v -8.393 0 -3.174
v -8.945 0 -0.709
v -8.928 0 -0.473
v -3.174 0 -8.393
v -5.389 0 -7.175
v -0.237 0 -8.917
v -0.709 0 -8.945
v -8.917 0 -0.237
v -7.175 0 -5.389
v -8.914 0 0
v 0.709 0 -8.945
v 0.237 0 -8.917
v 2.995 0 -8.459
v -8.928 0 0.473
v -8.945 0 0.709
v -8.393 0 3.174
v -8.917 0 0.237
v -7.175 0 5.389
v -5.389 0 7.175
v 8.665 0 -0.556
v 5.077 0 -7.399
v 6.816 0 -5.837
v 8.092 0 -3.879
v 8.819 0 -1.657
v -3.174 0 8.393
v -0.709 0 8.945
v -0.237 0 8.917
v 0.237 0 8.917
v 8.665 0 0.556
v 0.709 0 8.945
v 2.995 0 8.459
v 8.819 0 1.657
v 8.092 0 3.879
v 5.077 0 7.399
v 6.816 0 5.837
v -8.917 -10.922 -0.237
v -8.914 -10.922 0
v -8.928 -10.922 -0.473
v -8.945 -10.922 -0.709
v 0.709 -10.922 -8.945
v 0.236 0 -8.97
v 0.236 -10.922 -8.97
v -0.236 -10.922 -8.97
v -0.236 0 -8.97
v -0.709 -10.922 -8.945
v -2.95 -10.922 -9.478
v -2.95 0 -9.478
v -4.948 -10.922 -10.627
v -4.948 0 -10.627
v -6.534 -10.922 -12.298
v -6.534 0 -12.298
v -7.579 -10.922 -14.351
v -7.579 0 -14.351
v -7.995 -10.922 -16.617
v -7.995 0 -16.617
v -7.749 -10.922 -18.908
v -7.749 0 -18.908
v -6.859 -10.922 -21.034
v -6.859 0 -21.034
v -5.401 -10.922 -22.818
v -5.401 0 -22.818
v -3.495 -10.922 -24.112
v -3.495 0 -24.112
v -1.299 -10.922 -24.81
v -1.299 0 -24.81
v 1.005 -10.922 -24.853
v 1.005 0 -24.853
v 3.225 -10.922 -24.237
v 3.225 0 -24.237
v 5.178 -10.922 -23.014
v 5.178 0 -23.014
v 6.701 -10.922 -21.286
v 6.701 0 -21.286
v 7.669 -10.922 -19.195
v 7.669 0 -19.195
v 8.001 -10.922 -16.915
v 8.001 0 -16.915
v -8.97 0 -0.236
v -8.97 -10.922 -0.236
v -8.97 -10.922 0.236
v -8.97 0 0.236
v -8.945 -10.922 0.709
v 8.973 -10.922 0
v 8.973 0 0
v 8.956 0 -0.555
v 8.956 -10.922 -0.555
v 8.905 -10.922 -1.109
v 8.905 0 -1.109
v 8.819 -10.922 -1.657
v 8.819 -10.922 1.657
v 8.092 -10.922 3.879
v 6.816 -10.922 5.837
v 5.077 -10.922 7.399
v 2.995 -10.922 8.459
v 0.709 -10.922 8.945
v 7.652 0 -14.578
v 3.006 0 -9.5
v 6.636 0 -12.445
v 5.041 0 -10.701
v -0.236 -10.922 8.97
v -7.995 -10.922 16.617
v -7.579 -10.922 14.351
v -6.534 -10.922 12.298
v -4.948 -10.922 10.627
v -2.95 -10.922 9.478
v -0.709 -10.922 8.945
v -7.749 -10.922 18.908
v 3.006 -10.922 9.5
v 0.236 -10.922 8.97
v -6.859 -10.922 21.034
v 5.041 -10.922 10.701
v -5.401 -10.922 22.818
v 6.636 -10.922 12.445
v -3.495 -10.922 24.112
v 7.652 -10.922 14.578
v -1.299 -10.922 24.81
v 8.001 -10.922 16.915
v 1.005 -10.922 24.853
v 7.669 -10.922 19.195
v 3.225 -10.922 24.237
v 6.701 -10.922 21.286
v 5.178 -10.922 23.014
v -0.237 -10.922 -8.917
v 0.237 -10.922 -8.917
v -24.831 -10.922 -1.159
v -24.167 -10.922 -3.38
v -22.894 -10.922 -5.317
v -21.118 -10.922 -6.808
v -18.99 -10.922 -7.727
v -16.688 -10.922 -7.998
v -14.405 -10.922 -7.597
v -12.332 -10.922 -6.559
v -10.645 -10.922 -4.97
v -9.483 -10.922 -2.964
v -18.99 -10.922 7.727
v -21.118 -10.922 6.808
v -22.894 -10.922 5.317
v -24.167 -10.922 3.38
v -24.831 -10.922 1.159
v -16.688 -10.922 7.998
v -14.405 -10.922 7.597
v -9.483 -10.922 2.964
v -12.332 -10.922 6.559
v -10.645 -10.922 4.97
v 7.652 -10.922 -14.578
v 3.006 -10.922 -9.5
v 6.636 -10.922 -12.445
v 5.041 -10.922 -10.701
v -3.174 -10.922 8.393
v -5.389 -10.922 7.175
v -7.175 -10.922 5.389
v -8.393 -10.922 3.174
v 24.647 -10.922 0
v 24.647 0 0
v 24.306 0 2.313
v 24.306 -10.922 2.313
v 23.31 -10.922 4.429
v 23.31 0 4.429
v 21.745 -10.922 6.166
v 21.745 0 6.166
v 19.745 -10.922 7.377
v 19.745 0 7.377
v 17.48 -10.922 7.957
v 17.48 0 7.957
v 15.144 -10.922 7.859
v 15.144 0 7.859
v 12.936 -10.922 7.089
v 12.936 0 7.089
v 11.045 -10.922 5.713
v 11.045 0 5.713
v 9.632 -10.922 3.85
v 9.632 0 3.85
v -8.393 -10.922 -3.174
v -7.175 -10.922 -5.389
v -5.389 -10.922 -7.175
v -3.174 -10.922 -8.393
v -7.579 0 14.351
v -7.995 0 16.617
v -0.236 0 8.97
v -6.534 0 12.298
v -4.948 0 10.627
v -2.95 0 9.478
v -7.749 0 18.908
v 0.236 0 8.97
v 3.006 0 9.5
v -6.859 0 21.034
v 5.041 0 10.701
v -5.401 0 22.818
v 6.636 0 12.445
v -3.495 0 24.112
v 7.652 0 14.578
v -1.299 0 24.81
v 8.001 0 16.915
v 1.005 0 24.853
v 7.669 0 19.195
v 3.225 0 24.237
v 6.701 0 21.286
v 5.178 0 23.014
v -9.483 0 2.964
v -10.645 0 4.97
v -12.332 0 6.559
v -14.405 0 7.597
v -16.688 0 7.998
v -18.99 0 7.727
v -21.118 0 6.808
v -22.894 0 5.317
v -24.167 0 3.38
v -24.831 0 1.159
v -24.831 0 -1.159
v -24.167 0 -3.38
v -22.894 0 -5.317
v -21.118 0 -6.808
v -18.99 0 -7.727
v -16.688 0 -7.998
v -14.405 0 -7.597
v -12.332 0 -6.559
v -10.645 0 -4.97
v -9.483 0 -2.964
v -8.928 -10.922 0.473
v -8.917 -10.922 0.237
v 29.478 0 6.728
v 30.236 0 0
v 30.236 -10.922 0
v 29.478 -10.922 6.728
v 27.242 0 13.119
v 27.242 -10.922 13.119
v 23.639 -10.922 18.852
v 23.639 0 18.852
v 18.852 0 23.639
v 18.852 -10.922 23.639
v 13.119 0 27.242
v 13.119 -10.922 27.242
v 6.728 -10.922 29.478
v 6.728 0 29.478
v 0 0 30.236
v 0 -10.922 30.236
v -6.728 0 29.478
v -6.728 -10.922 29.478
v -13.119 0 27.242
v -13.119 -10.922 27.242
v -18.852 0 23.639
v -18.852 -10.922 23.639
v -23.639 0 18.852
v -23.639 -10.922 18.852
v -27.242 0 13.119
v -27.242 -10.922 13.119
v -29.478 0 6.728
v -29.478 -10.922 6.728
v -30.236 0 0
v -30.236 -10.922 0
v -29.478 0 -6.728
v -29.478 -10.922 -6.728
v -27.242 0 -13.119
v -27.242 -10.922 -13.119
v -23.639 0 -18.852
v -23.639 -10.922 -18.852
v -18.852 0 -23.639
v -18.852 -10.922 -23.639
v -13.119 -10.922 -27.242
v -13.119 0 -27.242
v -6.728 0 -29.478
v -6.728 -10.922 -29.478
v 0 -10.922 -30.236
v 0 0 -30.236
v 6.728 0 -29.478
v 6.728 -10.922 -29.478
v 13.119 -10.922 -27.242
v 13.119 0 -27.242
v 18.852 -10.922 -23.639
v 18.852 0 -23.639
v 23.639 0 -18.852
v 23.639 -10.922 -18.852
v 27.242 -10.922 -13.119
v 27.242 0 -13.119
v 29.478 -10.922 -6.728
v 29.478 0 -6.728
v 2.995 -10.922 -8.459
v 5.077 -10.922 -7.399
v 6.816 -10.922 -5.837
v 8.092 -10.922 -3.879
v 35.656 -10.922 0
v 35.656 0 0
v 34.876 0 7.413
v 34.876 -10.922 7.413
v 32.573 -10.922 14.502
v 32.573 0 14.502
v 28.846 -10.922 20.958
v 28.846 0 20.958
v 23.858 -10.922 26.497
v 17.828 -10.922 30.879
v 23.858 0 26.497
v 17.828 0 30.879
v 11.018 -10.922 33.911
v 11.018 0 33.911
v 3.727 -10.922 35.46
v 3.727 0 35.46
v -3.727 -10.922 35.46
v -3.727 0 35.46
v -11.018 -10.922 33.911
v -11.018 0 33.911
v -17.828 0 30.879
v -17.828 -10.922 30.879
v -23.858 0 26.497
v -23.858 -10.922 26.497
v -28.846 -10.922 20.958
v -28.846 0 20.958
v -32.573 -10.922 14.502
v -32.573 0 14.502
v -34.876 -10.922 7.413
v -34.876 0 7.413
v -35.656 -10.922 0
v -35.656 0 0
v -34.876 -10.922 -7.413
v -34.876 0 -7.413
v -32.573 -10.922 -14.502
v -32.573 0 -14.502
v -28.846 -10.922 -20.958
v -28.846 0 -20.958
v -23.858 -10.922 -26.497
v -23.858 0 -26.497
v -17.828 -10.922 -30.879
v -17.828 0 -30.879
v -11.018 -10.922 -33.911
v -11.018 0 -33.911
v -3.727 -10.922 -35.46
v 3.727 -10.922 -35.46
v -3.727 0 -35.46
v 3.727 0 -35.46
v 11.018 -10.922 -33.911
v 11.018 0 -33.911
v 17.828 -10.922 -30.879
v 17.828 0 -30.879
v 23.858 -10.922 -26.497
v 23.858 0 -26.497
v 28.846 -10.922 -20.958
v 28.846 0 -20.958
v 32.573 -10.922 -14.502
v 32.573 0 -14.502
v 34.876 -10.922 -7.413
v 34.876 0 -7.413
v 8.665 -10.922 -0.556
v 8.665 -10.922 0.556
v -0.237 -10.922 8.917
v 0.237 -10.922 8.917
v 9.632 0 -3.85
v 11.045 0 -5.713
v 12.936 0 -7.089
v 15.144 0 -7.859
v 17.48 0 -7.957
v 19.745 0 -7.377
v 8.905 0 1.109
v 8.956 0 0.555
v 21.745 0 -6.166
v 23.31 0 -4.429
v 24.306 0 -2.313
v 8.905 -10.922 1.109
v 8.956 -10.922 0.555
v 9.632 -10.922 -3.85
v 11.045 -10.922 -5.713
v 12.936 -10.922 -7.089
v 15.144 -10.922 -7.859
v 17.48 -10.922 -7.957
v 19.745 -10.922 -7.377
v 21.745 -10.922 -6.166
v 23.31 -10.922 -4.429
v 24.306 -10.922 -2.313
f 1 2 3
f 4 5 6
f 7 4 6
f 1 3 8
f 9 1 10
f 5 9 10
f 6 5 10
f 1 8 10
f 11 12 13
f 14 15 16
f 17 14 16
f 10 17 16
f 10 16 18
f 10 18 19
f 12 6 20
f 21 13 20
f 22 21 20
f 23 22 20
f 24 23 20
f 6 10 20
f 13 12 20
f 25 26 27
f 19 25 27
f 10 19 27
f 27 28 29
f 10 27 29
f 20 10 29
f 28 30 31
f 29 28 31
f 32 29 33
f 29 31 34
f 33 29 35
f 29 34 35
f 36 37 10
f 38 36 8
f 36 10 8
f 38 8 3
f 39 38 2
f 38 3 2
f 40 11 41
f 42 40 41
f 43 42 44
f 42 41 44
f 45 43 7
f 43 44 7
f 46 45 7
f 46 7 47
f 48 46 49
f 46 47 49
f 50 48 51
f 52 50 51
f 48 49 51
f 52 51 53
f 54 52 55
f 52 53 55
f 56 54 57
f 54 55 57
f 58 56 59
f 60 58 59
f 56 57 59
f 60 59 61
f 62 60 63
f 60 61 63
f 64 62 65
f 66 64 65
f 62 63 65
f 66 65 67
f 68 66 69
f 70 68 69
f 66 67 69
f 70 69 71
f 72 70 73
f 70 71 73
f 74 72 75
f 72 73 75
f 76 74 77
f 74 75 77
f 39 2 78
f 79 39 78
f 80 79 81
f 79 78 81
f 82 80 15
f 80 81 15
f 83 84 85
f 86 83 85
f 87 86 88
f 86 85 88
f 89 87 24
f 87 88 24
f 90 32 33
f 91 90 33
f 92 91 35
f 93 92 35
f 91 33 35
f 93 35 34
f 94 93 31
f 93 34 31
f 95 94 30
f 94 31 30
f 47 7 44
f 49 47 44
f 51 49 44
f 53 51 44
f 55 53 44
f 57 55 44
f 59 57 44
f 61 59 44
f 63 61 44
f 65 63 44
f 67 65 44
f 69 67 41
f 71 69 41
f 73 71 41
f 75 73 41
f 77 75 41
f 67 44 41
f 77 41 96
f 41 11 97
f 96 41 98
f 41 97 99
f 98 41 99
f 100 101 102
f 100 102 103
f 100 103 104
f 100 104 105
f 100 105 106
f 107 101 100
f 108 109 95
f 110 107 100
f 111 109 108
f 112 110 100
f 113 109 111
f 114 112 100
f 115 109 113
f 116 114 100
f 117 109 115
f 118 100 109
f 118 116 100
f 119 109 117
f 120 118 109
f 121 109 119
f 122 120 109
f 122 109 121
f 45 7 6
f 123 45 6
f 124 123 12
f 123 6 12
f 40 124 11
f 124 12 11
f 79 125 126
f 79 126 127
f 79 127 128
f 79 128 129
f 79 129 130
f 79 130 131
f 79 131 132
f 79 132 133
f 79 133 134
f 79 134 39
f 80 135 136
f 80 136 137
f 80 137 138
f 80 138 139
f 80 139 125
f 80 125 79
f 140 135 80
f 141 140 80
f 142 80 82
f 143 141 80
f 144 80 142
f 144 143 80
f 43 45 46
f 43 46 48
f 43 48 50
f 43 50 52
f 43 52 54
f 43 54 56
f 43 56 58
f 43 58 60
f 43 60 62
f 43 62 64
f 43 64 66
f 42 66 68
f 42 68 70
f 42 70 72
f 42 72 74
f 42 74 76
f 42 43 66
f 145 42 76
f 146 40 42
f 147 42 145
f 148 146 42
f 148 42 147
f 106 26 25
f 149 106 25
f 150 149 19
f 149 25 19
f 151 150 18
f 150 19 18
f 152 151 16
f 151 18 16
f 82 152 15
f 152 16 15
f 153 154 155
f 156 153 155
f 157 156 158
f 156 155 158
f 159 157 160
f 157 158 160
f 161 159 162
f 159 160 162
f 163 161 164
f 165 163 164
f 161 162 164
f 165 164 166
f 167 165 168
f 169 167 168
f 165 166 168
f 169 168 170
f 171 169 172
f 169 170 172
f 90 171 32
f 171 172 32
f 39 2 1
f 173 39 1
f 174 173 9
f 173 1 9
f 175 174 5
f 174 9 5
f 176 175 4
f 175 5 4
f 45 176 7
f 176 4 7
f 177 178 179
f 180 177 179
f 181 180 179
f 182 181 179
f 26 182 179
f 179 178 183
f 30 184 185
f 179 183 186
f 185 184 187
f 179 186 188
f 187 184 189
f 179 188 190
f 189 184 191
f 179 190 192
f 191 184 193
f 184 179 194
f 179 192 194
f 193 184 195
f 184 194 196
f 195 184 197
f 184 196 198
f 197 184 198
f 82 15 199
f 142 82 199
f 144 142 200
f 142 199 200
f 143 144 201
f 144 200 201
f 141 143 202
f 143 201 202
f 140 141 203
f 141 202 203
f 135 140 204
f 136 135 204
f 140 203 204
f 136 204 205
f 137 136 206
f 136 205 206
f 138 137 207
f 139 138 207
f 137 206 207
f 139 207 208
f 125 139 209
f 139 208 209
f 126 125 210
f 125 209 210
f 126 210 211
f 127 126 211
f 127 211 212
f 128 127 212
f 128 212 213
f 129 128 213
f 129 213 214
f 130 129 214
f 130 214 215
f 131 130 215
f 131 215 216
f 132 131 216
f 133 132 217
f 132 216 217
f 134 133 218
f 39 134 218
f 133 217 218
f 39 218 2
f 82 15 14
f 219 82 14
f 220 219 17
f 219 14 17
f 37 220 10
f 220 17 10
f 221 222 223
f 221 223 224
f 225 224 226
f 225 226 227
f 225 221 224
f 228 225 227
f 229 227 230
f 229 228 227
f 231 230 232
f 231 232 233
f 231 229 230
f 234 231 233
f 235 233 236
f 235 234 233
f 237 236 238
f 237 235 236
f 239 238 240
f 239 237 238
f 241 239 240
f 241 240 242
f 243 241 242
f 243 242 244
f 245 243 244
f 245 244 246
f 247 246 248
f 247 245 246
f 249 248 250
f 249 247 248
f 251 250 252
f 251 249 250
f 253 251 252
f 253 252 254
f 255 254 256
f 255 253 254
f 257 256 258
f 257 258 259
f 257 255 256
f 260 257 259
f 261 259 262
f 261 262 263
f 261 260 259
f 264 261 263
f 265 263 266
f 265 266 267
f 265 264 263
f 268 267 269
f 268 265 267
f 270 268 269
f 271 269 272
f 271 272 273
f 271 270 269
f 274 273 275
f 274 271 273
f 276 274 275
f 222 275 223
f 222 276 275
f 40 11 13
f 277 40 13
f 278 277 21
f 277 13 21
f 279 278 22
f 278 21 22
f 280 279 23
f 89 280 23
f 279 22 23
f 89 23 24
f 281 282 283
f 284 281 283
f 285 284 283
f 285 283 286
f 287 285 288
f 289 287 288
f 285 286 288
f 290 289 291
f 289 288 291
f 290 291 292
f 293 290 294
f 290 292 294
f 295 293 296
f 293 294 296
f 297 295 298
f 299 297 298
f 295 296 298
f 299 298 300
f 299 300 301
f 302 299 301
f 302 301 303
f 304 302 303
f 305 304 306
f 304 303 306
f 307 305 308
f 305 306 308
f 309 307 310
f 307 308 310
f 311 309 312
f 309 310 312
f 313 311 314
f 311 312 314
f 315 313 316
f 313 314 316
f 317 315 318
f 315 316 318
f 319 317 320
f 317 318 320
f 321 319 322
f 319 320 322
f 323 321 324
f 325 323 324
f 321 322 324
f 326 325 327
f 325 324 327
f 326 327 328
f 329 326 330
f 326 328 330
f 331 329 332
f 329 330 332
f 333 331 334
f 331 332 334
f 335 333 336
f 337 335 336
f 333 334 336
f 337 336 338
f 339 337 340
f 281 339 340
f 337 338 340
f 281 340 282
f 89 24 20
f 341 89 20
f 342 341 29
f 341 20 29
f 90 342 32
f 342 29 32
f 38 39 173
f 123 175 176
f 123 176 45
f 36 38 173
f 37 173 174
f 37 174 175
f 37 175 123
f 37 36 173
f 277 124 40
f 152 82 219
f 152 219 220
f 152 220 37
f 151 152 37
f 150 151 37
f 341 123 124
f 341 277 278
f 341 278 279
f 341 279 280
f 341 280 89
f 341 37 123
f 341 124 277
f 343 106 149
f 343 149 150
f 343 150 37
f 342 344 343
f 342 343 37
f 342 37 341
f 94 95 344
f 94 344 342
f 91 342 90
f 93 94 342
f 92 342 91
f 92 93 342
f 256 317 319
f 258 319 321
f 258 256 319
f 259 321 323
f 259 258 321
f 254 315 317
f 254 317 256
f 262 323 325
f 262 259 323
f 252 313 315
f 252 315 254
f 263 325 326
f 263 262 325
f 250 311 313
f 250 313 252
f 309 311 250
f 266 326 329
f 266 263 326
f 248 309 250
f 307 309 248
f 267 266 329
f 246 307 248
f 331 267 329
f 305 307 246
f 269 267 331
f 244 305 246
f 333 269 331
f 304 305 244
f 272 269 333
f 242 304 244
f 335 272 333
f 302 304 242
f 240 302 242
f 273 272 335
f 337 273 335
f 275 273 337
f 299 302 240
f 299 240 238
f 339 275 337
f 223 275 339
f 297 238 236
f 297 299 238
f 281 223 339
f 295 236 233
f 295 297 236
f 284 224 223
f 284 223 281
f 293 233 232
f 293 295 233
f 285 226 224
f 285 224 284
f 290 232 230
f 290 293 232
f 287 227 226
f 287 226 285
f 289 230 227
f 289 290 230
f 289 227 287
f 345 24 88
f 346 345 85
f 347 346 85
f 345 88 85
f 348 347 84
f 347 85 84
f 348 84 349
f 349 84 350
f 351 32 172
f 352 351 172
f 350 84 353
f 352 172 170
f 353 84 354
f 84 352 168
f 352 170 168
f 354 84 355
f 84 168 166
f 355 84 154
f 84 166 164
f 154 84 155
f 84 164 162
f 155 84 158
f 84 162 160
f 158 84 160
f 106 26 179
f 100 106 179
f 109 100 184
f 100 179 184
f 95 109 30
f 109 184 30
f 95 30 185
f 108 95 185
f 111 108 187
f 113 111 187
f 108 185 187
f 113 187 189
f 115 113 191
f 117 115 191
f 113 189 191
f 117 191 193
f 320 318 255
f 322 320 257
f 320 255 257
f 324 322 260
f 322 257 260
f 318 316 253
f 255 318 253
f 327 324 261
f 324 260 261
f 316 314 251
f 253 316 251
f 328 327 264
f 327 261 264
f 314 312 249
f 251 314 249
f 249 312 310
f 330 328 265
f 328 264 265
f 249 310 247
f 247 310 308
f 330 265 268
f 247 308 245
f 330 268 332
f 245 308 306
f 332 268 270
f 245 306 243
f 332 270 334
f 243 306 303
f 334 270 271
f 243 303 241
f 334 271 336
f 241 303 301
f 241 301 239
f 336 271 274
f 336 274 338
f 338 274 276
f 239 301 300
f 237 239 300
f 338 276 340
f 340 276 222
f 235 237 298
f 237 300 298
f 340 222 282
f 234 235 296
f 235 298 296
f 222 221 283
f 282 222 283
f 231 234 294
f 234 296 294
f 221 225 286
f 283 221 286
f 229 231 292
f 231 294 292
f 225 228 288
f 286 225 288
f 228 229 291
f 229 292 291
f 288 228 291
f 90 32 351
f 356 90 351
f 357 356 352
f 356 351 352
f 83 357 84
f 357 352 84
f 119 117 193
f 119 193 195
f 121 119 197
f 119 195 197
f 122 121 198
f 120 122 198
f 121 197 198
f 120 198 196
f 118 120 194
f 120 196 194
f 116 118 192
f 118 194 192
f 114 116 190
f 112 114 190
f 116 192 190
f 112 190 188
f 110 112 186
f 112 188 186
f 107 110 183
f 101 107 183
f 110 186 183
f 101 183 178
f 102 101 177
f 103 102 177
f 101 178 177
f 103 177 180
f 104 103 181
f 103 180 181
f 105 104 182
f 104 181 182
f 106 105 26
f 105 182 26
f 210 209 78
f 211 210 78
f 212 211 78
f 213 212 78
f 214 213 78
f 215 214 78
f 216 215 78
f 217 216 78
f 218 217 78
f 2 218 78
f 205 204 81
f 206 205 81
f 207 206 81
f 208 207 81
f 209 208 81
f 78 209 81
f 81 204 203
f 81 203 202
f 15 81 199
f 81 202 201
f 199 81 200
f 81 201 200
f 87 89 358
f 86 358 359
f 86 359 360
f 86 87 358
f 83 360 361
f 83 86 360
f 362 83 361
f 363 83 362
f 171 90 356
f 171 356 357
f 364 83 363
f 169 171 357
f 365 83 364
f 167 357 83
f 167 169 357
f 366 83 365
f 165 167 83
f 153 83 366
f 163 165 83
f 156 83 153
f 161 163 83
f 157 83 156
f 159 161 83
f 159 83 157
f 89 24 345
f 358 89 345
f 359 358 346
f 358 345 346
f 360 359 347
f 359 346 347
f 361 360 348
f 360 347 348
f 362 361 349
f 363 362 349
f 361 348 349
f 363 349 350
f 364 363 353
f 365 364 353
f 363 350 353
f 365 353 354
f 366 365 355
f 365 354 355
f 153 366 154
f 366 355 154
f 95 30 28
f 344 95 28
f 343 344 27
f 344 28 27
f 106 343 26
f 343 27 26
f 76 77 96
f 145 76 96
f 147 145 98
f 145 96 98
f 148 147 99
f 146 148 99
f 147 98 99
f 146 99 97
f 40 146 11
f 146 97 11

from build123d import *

# Parameters (mm, degrees)
F0_R     = 35.6556248562
F0_R_2   = 30.2358293925
F1_DEPTH = 10.922
F0_R_3   = 6.3373


with BuildPart() as f1:
    # F0 (on Front) → F1 (new body)
    with BuildSketch(Plane.XZ):
        Circle(F0_R)
        Circle(F0_R_2, mode=Mode.SUBTRACT)
    extrude(amount=F1_DEPTH)


with BuildPart() as f1b:
    # F0 (on Front) → F1, piece 2 (new body)
    with BuildSketch(Plane.XZ):
        with BuildLine():
            ThreePointArc((-0.7087351257, 8.9453169897), (0, 8.9733495153), (0.7087351257, 8.9453169897))
            ThreePointArc((0.7087351257, 8.9453169897), (5.9028209672, 11.513688683), (8.001, 16.914865002))
            ThreePointArc((8.001, 16.914865002), (-5.4011763191, 22.8176859692), (-0.7087351257, 8.9453169897))
        make_face()
    extrude(amount=F1_DEPTH)


with BuildPart() as f1c:
    # F0 (on Front) → F1, piece 3 (new body)
    with BuildSketch(Plane.XZ):
        with BuildLine():
            ThreePointArc((8.8189423852, -1.6574850619), (8.6453777423, 0), (8.8189423852, 1.6574850619))
            ThreePointArc((8.8189423852, 1.6574850619), (5.9976898252, 6.674482623), (0.7087351257, 8.9453169897))
            ThreePointArc((0.7087351257, 8.9453169897), (0, 8.913865002), (-0.7087351257, 8.9453169897))
            ThreePointArc((-0.7087351257, 8.9453169897), (-6.3451162922, 6.3451162922), (-8.9453169897, 0.7087351257))
            ThreePointArc((-8.9453169897, 0.7087351257), (-8.9217318664, 0.3547163324), (-8.913865002, 0))
            ThreePointArc((-8.913865002, 0), (-8.9217318664, -0.3547163324), (-8.9453169897, -0.7087351257))
            ThreePointArc((-8.9453169897, -0.7087351257), (-6.3451162922, -6.3451162922), (-0.7087351257, -8.9453169897))
            ThreePointArc((-0.7087351257, -8.9453169897), (0, -8.913865002), (0.7087351257, -8.9453169897))
            ThreePointArc((0.7087351257, -8.9453169897), (5.9976898252, -6.674482623), (8.8189423852, -1.6574850619))
        make_face()
        Circle(F0_R_3, mode=Mode.SUBTRACT)
        Circle(F0_R_3)
    extrude(amount=F1_DEPTH)


with BuildPart() as f1d:
    # F0 (on Front) → F1, piece 4 (new body)
    with BuildSketch(Plane.XZ):
        with BuildLine():
            ThreePointArc((8.8189423852, 1.6574850619), (8.9346643446, 0.8323308075), (8.9733495153, 0))
            ThreePointArc((8.9733495153, 0), (8.9346643446, -0.8323308075), (8.8189423852, -1.6574850619))
            ThreePointArc((8.8189423852, -1.6574850619), (17.4796516192, -7.957490537), (24.6473777423, 0))
            ThreePointArc((24.6473777423, 0), (17.4796516192, 7.957490537), (8.8189423852, 1.6574850619))
        make_face()
    extrude(amount=F1_DEPTH)


with BuildPart() as f1e:
    # F0 (on Front) → F1, piece 5 (new body)
    with BuildSketch(Plane.XZ):
        with BuildLine():
            ThreePointArc((-8.9453169897, -0.7087351257), (-8.9733495153, 0), (-8.9453169897, 0.7087351257))
            ThreePointArc((-8.9453169897, 0.7087351257), (-24.915865002, 0), (-8.9453169897, -0.7087351257))
        make_face()
    extrude(amount=F1_DEPTH)


with BuildPart() as f1f:
    # F0 (on Front) → F1, piece 6 (new body)
    with BuildSketch(Plane.XZ):
        with BuildLine():
            ThreePointArc((8.001, -16.914865002), (5.9028209672, -11.513688683), (0.7087351257, -8.9453169897))
            ThreePointArc((0.7087351257, -8.9453169897), (0, -8.9733495153), (-0.7087351257, -8.9453169897))
            ThreePointArc((-0.7087351257, -8.9453169897), (-5.4011763191, -22.8176859692), (8.001, -16.914865002))
        make_face()
    extrude(amount=F1_DEPTH)


solid = Compound([f1.part, f1b.part, f1c.part, f1d.part, f1e.part, f1f.part])
